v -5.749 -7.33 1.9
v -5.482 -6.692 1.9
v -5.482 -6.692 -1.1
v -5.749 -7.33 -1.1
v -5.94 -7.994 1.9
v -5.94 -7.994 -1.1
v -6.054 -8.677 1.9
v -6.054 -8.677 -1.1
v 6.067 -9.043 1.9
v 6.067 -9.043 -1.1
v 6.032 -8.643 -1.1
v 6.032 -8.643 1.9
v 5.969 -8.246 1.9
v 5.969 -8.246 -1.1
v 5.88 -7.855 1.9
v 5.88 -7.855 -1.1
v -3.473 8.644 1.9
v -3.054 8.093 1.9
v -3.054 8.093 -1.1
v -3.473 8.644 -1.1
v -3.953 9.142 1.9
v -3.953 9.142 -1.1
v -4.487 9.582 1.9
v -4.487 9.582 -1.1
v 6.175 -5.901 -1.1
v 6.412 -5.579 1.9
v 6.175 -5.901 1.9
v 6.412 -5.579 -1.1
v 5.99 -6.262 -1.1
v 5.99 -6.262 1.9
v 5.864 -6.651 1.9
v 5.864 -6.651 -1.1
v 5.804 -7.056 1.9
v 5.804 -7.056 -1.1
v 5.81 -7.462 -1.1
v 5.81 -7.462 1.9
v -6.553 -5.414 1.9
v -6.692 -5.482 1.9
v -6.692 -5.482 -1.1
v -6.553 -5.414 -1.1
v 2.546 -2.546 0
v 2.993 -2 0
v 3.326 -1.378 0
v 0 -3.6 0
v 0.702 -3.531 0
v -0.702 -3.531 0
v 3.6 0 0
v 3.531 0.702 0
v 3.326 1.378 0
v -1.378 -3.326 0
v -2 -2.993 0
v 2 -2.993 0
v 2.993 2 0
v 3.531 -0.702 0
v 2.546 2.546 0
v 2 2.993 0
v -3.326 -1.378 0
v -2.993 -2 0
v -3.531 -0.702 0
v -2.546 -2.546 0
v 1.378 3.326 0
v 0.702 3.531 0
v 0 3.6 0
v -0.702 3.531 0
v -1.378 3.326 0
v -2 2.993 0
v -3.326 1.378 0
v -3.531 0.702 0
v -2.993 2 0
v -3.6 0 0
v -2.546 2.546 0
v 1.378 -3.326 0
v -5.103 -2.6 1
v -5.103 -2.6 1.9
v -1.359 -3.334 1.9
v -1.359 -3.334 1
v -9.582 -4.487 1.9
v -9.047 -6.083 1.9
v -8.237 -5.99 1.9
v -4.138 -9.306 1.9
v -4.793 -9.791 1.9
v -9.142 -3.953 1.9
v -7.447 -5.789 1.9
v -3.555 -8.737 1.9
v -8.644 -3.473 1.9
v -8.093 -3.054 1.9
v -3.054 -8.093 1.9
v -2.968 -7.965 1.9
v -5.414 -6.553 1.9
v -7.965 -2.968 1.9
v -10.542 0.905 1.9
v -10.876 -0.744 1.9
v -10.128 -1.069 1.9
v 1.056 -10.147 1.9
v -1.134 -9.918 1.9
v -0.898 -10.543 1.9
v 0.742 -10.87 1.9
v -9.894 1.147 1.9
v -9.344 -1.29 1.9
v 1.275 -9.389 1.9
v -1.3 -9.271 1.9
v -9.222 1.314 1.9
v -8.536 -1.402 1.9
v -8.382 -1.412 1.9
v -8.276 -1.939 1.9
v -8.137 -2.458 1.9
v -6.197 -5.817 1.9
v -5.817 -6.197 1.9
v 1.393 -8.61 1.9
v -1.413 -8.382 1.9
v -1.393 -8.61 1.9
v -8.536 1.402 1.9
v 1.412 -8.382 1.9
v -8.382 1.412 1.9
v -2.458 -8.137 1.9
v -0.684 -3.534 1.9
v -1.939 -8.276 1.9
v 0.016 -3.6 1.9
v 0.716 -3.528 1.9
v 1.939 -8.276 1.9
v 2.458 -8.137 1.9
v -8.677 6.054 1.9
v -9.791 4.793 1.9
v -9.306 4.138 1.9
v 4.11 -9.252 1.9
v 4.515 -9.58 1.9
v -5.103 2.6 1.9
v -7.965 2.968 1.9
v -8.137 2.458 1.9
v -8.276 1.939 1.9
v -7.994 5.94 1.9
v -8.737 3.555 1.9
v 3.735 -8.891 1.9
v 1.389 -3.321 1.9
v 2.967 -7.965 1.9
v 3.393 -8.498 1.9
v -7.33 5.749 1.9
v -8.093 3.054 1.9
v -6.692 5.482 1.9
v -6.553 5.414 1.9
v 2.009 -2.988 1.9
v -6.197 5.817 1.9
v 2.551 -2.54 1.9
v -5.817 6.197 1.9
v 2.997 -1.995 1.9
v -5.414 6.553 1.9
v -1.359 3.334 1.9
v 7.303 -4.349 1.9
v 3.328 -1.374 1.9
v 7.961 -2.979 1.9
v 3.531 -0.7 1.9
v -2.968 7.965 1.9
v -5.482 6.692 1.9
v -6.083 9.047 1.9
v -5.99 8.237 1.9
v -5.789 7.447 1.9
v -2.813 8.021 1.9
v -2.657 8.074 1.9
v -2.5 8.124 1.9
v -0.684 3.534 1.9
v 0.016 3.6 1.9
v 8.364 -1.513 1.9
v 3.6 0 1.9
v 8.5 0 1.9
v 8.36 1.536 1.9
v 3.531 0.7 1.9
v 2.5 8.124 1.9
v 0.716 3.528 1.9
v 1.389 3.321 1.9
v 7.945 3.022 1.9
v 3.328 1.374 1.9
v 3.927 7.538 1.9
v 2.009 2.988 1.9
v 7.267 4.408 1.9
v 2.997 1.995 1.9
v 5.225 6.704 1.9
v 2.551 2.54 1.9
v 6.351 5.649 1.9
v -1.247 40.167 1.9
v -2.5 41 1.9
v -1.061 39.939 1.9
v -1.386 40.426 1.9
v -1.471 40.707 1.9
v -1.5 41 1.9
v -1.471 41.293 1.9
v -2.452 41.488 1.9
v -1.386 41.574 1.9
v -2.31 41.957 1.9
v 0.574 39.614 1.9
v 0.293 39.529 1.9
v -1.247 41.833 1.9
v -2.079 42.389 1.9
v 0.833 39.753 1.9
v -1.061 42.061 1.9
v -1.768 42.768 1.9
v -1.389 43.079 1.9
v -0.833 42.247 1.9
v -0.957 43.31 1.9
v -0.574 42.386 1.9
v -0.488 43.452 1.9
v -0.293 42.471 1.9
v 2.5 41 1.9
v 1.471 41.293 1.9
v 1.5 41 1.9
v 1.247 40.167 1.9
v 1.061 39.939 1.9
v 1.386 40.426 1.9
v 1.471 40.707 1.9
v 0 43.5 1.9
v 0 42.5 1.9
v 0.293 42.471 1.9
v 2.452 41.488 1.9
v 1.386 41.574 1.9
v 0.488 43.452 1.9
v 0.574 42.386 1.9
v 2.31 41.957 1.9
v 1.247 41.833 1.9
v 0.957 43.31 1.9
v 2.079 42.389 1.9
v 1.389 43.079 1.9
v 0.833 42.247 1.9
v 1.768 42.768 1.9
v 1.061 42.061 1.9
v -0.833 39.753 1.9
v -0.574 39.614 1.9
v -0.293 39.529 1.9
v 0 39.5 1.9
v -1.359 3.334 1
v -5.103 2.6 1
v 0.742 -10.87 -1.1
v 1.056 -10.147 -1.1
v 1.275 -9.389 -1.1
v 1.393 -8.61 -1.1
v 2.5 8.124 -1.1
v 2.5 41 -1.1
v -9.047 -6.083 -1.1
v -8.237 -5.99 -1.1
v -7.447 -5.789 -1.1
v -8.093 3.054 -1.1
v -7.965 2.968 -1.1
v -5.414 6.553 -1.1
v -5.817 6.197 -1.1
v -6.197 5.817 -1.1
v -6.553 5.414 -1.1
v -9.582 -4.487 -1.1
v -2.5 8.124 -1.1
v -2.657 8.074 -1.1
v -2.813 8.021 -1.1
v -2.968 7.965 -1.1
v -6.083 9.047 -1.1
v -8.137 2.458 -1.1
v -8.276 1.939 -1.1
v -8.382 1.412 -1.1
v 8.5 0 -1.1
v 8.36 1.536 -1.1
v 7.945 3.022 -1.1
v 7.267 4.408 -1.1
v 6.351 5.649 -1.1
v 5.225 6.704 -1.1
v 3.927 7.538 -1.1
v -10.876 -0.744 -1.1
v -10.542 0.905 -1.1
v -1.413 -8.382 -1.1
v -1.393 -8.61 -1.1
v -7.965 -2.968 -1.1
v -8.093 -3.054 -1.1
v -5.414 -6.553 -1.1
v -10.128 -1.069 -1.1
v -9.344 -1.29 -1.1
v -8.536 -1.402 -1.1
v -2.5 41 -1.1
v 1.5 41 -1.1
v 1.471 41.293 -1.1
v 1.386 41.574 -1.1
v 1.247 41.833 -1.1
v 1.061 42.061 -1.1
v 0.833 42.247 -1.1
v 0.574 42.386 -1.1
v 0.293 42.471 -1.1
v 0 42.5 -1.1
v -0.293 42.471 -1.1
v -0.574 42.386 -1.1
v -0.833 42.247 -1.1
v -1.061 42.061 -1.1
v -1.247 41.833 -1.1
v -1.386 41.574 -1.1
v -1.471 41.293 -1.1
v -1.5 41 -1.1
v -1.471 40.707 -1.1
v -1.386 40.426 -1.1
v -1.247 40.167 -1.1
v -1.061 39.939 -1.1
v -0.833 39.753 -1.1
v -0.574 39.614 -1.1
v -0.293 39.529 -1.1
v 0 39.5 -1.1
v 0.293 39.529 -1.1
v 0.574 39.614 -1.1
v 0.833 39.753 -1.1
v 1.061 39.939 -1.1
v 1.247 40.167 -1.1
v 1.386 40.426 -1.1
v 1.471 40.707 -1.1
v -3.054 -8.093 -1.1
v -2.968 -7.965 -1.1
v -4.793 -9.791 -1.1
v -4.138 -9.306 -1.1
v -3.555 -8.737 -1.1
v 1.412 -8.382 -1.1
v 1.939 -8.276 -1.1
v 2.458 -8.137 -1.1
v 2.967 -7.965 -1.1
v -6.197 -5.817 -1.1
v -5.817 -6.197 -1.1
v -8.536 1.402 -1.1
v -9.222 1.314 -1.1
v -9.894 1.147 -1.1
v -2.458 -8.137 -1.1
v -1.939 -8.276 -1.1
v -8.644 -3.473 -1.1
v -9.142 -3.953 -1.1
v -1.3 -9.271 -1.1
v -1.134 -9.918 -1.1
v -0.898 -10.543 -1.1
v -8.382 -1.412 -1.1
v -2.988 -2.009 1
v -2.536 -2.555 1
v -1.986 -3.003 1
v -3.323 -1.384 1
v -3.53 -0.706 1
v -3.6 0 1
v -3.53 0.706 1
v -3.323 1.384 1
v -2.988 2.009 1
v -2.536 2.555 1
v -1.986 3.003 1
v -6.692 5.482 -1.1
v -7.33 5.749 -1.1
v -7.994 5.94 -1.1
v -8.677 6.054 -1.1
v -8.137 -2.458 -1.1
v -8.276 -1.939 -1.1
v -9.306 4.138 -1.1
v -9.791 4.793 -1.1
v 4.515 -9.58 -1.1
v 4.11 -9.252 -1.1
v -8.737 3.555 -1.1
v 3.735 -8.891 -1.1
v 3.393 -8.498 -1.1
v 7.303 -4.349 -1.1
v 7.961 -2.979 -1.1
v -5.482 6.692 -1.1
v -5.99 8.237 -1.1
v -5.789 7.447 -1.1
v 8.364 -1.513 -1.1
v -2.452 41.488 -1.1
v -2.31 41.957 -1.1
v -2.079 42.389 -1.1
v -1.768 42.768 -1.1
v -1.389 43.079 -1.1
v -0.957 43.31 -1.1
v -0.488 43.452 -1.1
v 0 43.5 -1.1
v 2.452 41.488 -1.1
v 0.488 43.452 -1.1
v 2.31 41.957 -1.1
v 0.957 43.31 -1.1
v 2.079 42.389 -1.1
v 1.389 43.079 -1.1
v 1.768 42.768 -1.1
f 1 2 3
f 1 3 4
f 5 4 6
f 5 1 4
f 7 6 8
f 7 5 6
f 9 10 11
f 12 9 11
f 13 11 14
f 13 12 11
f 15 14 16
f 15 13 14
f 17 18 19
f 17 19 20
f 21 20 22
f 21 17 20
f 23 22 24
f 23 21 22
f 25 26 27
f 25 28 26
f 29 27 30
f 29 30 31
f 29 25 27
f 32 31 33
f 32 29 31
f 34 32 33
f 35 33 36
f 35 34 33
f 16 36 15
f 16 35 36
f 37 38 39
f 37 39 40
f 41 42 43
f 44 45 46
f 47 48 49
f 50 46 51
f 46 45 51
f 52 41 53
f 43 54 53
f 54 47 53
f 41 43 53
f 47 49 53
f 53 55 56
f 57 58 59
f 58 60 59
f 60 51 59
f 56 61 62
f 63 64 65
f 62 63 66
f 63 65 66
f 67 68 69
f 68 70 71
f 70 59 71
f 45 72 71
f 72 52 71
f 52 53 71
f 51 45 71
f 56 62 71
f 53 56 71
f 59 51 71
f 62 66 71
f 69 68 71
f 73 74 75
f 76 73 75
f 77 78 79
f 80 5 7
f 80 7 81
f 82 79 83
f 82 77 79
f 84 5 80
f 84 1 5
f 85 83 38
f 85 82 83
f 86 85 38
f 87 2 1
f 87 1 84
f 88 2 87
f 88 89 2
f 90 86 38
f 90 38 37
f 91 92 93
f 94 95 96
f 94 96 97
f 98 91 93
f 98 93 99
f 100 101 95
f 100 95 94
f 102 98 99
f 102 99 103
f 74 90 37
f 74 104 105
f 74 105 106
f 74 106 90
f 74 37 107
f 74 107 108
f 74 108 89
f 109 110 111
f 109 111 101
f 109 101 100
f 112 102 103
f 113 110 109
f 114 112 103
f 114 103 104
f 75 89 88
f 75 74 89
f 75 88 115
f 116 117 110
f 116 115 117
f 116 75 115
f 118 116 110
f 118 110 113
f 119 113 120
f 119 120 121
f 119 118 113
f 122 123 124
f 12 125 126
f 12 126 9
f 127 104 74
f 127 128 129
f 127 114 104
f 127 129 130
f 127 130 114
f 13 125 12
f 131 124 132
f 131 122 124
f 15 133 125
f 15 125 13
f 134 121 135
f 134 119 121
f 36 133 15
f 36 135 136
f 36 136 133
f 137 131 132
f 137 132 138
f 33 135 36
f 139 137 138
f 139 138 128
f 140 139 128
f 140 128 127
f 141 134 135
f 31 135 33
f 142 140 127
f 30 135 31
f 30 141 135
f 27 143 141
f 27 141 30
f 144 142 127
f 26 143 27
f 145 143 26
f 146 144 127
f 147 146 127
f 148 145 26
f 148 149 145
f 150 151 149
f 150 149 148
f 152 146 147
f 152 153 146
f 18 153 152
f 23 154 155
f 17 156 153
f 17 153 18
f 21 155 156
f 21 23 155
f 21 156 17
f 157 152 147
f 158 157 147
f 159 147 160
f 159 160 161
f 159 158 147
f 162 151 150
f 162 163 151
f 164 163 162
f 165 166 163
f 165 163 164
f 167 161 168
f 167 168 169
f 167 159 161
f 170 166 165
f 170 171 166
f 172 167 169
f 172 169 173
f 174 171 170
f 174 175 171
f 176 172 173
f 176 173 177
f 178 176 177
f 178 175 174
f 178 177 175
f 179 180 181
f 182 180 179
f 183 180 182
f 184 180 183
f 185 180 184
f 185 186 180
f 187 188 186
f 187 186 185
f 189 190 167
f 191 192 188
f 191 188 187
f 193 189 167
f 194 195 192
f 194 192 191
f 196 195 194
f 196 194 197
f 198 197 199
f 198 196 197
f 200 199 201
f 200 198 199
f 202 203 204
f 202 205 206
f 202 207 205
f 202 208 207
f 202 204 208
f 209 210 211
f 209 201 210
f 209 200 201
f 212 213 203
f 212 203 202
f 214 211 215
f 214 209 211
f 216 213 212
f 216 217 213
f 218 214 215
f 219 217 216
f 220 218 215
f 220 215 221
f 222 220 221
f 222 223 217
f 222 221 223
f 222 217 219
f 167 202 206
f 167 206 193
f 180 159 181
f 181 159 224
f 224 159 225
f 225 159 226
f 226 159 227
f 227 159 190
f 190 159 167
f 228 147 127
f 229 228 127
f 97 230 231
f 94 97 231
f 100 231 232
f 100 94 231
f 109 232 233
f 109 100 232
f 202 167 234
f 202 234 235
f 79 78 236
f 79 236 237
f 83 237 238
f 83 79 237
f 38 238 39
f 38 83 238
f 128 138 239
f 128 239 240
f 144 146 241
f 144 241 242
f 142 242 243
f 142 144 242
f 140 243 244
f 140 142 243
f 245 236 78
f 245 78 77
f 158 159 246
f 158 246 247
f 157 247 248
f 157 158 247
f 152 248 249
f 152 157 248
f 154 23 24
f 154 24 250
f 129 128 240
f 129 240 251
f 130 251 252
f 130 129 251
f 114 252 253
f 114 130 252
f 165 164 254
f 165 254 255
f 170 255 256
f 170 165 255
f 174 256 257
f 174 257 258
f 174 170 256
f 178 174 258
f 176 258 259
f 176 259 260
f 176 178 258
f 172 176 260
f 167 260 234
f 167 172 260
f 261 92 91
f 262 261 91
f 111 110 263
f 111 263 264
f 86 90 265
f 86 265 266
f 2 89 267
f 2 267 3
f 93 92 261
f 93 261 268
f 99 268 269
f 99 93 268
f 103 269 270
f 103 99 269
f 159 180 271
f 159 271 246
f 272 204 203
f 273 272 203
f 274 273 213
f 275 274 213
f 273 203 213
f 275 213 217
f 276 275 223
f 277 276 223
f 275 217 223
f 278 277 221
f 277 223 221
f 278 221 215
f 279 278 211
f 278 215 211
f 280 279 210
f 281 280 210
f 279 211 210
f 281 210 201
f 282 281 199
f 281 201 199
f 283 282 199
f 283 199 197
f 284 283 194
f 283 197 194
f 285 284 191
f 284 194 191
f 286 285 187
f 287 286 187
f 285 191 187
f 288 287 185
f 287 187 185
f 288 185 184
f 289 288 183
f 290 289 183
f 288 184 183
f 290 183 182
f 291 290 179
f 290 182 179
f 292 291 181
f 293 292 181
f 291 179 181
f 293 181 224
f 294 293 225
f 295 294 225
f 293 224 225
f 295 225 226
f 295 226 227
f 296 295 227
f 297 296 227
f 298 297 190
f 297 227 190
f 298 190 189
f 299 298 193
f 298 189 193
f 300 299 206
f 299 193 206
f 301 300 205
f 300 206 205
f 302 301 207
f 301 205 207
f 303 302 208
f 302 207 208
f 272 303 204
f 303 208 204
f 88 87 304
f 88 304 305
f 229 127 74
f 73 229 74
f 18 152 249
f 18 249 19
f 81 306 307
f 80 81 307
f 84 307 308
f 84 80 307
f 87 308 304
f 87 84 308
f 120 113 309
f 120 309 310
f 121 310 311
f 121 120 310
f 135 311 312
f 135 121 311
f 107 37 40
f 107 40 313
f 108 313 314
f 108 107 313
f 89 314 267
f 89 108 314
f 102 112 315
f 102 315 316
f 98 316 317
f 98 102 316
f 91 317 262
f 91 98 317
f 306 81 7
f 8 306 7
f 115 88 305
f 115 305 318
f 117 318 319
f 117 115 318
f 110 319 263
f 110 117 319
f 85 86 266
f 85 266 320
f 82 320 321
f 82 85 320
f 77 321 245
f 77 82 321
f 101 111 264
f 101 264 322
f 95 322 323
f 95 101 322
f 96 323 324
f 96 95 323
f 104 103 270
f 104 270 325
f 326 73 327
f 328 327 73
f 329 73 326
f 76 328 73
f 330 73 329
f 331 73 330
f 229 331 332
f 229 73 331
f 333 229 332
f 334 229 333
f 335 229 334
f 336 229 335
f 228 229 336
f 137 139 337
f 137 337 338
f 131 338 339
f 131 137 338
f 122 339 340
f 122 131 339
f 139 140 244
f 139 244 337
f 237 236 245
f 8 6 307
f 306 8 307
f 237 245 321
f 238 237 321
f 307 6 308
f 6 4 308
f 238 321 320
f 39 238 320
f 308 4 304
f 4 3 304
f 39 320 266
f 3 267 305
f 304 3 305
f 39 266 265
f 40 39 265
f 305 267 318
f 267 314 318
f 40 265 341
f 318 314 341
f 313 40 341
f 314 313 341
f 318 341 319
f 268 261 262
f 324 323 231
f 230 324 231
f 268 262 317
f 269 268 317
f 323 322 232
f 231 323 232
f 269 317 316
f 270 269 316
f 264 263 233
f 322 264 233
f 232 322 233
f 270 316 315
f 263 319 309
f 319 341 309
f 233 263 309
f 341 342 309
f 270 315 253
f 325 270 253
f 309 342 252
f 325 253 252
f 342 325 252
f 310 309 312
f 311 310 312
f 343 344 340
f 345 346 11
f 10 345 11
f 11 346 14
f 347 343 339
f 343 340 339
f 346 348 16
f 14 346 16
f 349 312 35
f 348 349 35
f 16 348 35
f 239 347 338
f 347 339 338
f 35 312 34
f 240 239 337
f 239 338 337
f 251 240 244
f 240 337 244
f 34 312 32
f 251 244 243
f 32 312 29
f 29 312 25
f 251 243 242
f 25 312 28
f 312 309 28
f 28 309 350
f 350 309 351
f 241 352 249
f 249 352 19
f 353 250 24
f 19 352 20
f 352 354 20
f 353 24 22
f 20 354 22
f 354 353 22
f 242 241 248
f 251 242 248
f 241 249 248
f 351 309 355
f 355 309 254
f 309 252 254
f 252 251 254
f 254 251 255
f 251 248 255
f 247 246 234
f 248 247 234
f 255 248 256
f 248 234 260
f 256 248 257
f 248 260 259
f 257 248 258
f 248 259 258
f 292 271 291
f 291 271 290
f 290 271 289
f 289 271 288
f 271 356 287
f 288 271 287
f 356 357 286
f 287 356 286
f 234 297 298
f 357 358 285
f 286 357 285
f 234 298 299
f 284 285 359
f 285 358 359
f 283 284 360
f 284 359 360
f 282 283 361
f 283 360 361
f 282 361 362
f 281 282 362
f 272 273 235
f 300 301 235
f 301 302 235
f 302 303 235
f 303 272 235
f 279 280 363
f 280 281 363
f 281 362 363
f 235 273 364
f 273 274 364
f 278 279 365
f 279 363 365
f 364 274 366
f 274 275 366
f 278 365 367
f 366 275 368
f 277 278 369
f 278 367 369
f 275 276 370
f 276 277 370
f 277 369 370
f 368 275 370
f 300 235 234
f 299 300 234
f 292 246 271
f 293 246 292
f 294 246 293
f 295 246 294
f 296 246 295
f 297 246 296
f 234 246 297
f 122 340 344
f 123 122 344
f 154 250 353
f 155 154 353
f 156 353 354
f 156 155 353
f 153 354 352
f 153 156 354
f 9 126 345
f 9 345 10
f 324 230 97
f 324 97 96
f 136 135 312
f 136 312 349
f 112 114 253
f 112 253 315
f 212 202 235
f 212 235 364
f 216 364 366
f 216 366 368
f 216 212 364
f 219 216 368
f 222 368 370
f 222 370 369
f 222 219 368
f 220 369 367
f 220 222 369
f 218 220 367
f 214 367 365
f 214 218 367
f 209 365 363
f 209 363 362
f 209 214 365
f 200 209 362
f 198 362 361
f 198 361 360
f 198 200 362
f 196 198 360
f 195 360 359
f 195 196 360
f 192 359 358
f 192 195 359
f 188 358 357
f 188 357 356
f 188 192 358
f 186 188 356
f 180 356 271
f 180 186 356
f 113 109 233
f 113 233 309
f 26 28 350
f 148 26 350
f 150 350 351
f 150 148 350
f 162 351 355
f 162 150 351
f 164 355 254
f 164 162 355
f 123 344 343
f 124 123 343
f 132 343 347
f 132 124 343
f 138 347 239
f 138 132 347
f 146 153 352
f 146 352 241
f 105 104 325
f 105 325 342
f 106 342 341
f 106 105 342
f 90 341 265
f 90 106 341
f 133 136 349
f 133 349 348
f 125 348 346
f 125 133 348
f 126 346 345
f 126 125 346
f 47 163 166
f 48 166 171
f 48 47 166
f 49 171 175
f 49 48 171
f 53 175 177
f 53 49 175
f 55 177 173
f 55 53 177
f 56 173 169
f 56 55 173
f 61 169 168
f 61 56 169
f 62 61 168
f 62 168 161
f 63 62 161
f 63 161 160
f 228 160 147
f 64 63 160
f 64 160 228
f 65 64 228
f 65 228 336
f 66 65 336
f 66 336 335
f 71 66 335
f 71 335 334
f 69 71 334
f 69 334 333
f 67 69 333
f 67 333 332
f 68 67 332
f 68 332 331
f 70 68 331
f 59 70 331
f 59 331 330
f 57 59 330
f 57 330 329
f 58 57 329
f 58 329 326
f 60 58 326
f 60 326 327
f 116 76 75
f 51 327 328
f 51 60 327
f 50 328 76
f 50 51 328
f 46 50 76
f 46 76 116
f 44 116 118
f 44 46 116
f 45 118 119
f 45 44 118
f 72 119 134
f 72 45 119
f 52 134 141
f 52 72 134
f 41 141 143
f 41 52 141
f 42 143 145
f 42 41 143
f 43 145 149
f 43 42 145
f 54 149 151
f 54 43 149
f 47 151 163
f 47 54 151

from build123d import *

# Parameters (mm, degrees)
SKETCH1_R           = 1.5
BOSS_EXTRUDE1_DEPTH = 3
CUT_EXTRUDE2_DEPTH  = 0.9
SKETCH5_W           = 3.6
SKETCH5_H           = 3
FILLET1_R           = 2.5


with BuildPart() as part:
    # Sketch1 → Boss-Extrude1 (new body)
    with BuildSketch(Plane.XY.offset(1.9)):
        with BuildLine():
            Line((2.5, 8.124038405), (2.5, 41))
            ThreePointArc((2.5, 41), (0, 43.5), (-2.5, 41))
            Line((-2.5, 41), (-2.5, 8.124038405))
            ThreePointArc((-2.5, 8.124038405), (-2.735010245, 8.047963653), (-2.967710696, 7.965092167))
            Line((-2.967710696, 7.965092167), (-3.054167872, 8.093270203))
            ThreePointArc((-3.054167872, 8.093270203), (-4.342095244, 9.472160372), (-5.994566265, 10.382893341))
            ThreePointArc((-5.994566265, 10.382893341), (-6.032083889, 8.496444973), (-5.481893659, 6.691622066))
            Line((-5.481893659, 6.691622066), (-5.414116812, 6.552658937))
            ThreePointArc((-5.414116812, 6.552658937), (-6.01040764, 6.01040764), (-6.552658937, 5.414116812))
            Line((-6.552658937, 5.414116812), (-6.691622066, 5.481893659))
            ThreePointArc((-6.691622066, 5.481893659), (-8.496444973, 6.032083889), (-10.382893341, 5.994566265))
            ThreePointArc((-10.382893341, 5.994566265), (-9.472160372, 4.342095244), (-8.093270203, 3.054167872))
            Line((-8.093270203, 3.054167872), (-7.965092167, 2.967710696))
            ThreePointArc((-7.965092167, 2.967710696), (-8.210369523, 2.199961883), (-8.381827508, 1.41243323))
            Line((-8.381827508, 1.41243323), (-8.536061531, 1.401648136))
            ThreePointArc((-8.536061531, 1.401648136), (-10.374179133, 0.975715399), (-11.989132531, 0))
            ThreePointArc((-11.989132531, 0), (-10.374179133, -0.975715399), (-8.536061531, -1.401648136))
            Line((-8.536061531, -1.401648136), (-8.381827508, -1.41243323))
            ThreePointArc((-8.381827508, -1.41243323), (-8.210369523, -2.199961883), (-7.965092167, -2.967710696))
            Line((-7.965092167, -2.967710696), (-8.093270203, -3.054167872))
            ThreePointArc((-8.093270203, -3.054167872), (-9.472160372, -4.342095244), (-10.382893341, -5.994566265))
            ThreePointArc((-10.382893341, -5.994566265), (-8.496444973, -6.032083889), (-6.691622066, -5.481893659))
            Line((-6.691622066, -5.481893659), (-6.552658937, -5.414116812))
            ThreePointArc((-6.552658937, -5.414116812), (-6.01040764, -6.01040764), (-5.414116812, -6.552658937))
            Line((-5.414116812, -6.552658937), (-5.481893659, -6.691622066))
            ThreePointArc((-5.481893659, -6.691622066), (-6.032083889, -8.496444973), (-5.994566265, -10.382893341))
            ThreePointArc((-5.994566265, -10.382893341), (-4.342095244, -9.472160372), (-3.054167872, -8.093270203))
            Line((-3.054167872, -8.093270203), (-2.967710696, -7.965092167))
            ThreePointArc((-2.967710696, -7.965092167), (-2.200030635, -8.210351101), (-1.412573605, -8.381803852))
            Line((-1.412573605, -8.381803852), (-1.393124693, -8.60968341))
            ThreePointArc((-1.393124693, -8.60968341), (-0.957124189, -10.404769076), (-0.000200717, -11.984872381))
            ThreePointArc((-0.000200717, -11.984872381), (0.95677568, -10.404801129), (1.39283631, -8.609730068))
            Line((1.39283631, -8.609730068), (1.412292855, -8.381851161))
            ThreePointArc((1.412292855, -8.381851161), (2.199774454, -8.210495053), (2.967443903, -7.965191566))
            Line((2.967443903, -7.965191566), (3.392820223, -8.498315042))
            ThreePointArc((3.392820223, -8.498315042), (4.564279824, -9.615969997), (5.992088536, -10.379404655))
            ThreePointArc((5.992088536, -10.379404655), (6.04494749, -8.761172247), (5.662865105, -7.187805396))
            Line((5.662865105, -7.187805396), (5.413897328, -6.552840279))
            ThreePointArc((5.413897328, -6.552840279), (7.689867596, -3.621593069), (8.5, 0))
            ThreePointArc((8.5, 0), (6.837397166, 5.049752469), (2.5, 8.124038405))
        make_face()
        with Locations((0, 41)):
            Circle(SKETCH1_R, mode=Mode.SUBTRACT)
    extrude(amount=-BOSS_EXTRUDE1_DEPTH)

    # Sketch4 → Cut-Extrude2 (cut)
    with BuildSketch(Plane.XY.offset(1.9)):
        with BuildLine():
            Line((-5.102940329, -2.6), (-1.358771093, -3.333727811))
            ThreePointArc((-1.358771093, -3.333727811), (-3.6, 0), (-1.358771093, 3.333727811))
            Line((-1.358771093, 3.333727811), (-5.102940329, 2.6))
            Line((-5.102940329, 2.6), (-5.102940329, -2.6))
        make_face()
    extrude(amount=-CUT_EXTRUDE2_DEPTH, mode=Mode.SUBTRACT)

    # Sketch5 → Cut-Revolve1 (revolve, cut)
    with BuildSketch(Plane(origin=(0, 0, 0), x_dir=(1, 0, 0), z_dir=(0, 1, 0))):
        with Locations((1.8, -1.5)):
            Rectangle(SKETCH5_W, SKETCH5_H)
    revolve(axis=Axis((0, 0, 0), (0, 0, 1)), mode=Mode.SUBTRACT)

    # Chamfer1
    # the kernel refuses this chamfer: 1.996823512, 1.978396736, 1.94931332, 1.412365401 mm, written as the material it takes off along each edge
    with BuildSketch(Plane(origin=(5.992088536, -10.379404655, 6.233820359), x_dir=(-0.8794300447910056, 0.4760281465616188, 0), z_dir=(0, 0, -1))) as chamfer1_piece_1:
        with BuildLine():
            Line((1.679904515, 0), (0.570181749, 1.211368913))
            ThreePointArc((0.570181749, 1.211368913), (0.257488937, 0.635031779), (0, 0))
            ThreePointArc((0, 0), (0.866421107, -0.059071898), (1.679904515, 0))
        make_face()
    extrude(amount=11.667640718, mode=Mode.SUBTRACT)
    with BuildSketch(Plane(origin=(-0.000200717, -11.984872381, 6.284042251), x_dir=(0.553758056262258, 0.8326776177637093, 0), z_dir=(0, 0, -1))) as chamfer1_piece_2:
        with BuildLine():
            Line((1.33943628, 0), (0.703391742, -1.546031937))
            ThreePointArc((0.703391742, -1.546031937), (0.308543545, -0.822544611), (0, 0))
            ThreePointArc((0, 0), (0.684773692, 0.037130534), (1.33943628, 0))
        make_face()
    extrude(amount=11.768084503, mode=Mode.SUBTRACT)
    with BuildSketch(Plane(origin=(-5.994566265, -10.382893341, 6.307600342), x_dir=(0.8971018613244867, 0.44182377754953556, 0), z_dir=(0, 0, -1)), Plane(origin=(-10.382893341, -5.994566265, 6.307600342), x_dir=(0.9978248904640774, -0.06592031530834563, 0), z_dir=(0, 0, -1)), Plane(origin=(-11.989132531, 0, 6.307600342), x_dir=(0.8311815460161414, -0.5560011129145489, 0), z_dir=(0, 0, -1))) as chamfer1_piece_3:
        with BuildLine():
            Line((1.33889649, 0), (0.700148491, -1.556942978))
            ThreePointArc((0.700148491, -1.556942978), (0.305807457, -0.828670891), (0, 0))
            ThreePointArc((0, 0), (0.684607685, 0.037444556), (1.33889649, 0))
        make_face()
    extrude(amount=11.815200684, mode=Mode.SUBTRACT)
    with BuildSketch(Plane(origin=(-10.382893341, 5.994566265, 6.307600342), x_dir=(0.9993864811320993, 0.035023725250178994, 0), z_dir=(0, 0, -1)), Plane(origin=(-5.994566265, 10.382893341, 6.307600342), x_dir=(0.8830059434842266, -0.4693618047642254, 0), z_dir=(0, 0, -1))) as chamfer1_piece_4:
        with BuildLine():
            Line((1.707126049, 0), (0.549125448, 1.221108125))
            ThreePointArc((0.549125448, 1.221108125), (0.246629708, 0.639737105), (0, 0))
            ThreePointArc((0, 0), (0.881190909, -0.060960877), (1.707126049, 0))
        make_face()
    extrude(amount=11.815200684, mode=Mode.SUBTRACT)

    # Fillet1
    fillet1_edges = [part.edges().sort_by_distance(p)[0] for p in [
        (5.413897328, -6.552840279, 0.4),
    ]]
    fillet(fillet1_edges, radius=FILLET1_R)


solid = part.part
